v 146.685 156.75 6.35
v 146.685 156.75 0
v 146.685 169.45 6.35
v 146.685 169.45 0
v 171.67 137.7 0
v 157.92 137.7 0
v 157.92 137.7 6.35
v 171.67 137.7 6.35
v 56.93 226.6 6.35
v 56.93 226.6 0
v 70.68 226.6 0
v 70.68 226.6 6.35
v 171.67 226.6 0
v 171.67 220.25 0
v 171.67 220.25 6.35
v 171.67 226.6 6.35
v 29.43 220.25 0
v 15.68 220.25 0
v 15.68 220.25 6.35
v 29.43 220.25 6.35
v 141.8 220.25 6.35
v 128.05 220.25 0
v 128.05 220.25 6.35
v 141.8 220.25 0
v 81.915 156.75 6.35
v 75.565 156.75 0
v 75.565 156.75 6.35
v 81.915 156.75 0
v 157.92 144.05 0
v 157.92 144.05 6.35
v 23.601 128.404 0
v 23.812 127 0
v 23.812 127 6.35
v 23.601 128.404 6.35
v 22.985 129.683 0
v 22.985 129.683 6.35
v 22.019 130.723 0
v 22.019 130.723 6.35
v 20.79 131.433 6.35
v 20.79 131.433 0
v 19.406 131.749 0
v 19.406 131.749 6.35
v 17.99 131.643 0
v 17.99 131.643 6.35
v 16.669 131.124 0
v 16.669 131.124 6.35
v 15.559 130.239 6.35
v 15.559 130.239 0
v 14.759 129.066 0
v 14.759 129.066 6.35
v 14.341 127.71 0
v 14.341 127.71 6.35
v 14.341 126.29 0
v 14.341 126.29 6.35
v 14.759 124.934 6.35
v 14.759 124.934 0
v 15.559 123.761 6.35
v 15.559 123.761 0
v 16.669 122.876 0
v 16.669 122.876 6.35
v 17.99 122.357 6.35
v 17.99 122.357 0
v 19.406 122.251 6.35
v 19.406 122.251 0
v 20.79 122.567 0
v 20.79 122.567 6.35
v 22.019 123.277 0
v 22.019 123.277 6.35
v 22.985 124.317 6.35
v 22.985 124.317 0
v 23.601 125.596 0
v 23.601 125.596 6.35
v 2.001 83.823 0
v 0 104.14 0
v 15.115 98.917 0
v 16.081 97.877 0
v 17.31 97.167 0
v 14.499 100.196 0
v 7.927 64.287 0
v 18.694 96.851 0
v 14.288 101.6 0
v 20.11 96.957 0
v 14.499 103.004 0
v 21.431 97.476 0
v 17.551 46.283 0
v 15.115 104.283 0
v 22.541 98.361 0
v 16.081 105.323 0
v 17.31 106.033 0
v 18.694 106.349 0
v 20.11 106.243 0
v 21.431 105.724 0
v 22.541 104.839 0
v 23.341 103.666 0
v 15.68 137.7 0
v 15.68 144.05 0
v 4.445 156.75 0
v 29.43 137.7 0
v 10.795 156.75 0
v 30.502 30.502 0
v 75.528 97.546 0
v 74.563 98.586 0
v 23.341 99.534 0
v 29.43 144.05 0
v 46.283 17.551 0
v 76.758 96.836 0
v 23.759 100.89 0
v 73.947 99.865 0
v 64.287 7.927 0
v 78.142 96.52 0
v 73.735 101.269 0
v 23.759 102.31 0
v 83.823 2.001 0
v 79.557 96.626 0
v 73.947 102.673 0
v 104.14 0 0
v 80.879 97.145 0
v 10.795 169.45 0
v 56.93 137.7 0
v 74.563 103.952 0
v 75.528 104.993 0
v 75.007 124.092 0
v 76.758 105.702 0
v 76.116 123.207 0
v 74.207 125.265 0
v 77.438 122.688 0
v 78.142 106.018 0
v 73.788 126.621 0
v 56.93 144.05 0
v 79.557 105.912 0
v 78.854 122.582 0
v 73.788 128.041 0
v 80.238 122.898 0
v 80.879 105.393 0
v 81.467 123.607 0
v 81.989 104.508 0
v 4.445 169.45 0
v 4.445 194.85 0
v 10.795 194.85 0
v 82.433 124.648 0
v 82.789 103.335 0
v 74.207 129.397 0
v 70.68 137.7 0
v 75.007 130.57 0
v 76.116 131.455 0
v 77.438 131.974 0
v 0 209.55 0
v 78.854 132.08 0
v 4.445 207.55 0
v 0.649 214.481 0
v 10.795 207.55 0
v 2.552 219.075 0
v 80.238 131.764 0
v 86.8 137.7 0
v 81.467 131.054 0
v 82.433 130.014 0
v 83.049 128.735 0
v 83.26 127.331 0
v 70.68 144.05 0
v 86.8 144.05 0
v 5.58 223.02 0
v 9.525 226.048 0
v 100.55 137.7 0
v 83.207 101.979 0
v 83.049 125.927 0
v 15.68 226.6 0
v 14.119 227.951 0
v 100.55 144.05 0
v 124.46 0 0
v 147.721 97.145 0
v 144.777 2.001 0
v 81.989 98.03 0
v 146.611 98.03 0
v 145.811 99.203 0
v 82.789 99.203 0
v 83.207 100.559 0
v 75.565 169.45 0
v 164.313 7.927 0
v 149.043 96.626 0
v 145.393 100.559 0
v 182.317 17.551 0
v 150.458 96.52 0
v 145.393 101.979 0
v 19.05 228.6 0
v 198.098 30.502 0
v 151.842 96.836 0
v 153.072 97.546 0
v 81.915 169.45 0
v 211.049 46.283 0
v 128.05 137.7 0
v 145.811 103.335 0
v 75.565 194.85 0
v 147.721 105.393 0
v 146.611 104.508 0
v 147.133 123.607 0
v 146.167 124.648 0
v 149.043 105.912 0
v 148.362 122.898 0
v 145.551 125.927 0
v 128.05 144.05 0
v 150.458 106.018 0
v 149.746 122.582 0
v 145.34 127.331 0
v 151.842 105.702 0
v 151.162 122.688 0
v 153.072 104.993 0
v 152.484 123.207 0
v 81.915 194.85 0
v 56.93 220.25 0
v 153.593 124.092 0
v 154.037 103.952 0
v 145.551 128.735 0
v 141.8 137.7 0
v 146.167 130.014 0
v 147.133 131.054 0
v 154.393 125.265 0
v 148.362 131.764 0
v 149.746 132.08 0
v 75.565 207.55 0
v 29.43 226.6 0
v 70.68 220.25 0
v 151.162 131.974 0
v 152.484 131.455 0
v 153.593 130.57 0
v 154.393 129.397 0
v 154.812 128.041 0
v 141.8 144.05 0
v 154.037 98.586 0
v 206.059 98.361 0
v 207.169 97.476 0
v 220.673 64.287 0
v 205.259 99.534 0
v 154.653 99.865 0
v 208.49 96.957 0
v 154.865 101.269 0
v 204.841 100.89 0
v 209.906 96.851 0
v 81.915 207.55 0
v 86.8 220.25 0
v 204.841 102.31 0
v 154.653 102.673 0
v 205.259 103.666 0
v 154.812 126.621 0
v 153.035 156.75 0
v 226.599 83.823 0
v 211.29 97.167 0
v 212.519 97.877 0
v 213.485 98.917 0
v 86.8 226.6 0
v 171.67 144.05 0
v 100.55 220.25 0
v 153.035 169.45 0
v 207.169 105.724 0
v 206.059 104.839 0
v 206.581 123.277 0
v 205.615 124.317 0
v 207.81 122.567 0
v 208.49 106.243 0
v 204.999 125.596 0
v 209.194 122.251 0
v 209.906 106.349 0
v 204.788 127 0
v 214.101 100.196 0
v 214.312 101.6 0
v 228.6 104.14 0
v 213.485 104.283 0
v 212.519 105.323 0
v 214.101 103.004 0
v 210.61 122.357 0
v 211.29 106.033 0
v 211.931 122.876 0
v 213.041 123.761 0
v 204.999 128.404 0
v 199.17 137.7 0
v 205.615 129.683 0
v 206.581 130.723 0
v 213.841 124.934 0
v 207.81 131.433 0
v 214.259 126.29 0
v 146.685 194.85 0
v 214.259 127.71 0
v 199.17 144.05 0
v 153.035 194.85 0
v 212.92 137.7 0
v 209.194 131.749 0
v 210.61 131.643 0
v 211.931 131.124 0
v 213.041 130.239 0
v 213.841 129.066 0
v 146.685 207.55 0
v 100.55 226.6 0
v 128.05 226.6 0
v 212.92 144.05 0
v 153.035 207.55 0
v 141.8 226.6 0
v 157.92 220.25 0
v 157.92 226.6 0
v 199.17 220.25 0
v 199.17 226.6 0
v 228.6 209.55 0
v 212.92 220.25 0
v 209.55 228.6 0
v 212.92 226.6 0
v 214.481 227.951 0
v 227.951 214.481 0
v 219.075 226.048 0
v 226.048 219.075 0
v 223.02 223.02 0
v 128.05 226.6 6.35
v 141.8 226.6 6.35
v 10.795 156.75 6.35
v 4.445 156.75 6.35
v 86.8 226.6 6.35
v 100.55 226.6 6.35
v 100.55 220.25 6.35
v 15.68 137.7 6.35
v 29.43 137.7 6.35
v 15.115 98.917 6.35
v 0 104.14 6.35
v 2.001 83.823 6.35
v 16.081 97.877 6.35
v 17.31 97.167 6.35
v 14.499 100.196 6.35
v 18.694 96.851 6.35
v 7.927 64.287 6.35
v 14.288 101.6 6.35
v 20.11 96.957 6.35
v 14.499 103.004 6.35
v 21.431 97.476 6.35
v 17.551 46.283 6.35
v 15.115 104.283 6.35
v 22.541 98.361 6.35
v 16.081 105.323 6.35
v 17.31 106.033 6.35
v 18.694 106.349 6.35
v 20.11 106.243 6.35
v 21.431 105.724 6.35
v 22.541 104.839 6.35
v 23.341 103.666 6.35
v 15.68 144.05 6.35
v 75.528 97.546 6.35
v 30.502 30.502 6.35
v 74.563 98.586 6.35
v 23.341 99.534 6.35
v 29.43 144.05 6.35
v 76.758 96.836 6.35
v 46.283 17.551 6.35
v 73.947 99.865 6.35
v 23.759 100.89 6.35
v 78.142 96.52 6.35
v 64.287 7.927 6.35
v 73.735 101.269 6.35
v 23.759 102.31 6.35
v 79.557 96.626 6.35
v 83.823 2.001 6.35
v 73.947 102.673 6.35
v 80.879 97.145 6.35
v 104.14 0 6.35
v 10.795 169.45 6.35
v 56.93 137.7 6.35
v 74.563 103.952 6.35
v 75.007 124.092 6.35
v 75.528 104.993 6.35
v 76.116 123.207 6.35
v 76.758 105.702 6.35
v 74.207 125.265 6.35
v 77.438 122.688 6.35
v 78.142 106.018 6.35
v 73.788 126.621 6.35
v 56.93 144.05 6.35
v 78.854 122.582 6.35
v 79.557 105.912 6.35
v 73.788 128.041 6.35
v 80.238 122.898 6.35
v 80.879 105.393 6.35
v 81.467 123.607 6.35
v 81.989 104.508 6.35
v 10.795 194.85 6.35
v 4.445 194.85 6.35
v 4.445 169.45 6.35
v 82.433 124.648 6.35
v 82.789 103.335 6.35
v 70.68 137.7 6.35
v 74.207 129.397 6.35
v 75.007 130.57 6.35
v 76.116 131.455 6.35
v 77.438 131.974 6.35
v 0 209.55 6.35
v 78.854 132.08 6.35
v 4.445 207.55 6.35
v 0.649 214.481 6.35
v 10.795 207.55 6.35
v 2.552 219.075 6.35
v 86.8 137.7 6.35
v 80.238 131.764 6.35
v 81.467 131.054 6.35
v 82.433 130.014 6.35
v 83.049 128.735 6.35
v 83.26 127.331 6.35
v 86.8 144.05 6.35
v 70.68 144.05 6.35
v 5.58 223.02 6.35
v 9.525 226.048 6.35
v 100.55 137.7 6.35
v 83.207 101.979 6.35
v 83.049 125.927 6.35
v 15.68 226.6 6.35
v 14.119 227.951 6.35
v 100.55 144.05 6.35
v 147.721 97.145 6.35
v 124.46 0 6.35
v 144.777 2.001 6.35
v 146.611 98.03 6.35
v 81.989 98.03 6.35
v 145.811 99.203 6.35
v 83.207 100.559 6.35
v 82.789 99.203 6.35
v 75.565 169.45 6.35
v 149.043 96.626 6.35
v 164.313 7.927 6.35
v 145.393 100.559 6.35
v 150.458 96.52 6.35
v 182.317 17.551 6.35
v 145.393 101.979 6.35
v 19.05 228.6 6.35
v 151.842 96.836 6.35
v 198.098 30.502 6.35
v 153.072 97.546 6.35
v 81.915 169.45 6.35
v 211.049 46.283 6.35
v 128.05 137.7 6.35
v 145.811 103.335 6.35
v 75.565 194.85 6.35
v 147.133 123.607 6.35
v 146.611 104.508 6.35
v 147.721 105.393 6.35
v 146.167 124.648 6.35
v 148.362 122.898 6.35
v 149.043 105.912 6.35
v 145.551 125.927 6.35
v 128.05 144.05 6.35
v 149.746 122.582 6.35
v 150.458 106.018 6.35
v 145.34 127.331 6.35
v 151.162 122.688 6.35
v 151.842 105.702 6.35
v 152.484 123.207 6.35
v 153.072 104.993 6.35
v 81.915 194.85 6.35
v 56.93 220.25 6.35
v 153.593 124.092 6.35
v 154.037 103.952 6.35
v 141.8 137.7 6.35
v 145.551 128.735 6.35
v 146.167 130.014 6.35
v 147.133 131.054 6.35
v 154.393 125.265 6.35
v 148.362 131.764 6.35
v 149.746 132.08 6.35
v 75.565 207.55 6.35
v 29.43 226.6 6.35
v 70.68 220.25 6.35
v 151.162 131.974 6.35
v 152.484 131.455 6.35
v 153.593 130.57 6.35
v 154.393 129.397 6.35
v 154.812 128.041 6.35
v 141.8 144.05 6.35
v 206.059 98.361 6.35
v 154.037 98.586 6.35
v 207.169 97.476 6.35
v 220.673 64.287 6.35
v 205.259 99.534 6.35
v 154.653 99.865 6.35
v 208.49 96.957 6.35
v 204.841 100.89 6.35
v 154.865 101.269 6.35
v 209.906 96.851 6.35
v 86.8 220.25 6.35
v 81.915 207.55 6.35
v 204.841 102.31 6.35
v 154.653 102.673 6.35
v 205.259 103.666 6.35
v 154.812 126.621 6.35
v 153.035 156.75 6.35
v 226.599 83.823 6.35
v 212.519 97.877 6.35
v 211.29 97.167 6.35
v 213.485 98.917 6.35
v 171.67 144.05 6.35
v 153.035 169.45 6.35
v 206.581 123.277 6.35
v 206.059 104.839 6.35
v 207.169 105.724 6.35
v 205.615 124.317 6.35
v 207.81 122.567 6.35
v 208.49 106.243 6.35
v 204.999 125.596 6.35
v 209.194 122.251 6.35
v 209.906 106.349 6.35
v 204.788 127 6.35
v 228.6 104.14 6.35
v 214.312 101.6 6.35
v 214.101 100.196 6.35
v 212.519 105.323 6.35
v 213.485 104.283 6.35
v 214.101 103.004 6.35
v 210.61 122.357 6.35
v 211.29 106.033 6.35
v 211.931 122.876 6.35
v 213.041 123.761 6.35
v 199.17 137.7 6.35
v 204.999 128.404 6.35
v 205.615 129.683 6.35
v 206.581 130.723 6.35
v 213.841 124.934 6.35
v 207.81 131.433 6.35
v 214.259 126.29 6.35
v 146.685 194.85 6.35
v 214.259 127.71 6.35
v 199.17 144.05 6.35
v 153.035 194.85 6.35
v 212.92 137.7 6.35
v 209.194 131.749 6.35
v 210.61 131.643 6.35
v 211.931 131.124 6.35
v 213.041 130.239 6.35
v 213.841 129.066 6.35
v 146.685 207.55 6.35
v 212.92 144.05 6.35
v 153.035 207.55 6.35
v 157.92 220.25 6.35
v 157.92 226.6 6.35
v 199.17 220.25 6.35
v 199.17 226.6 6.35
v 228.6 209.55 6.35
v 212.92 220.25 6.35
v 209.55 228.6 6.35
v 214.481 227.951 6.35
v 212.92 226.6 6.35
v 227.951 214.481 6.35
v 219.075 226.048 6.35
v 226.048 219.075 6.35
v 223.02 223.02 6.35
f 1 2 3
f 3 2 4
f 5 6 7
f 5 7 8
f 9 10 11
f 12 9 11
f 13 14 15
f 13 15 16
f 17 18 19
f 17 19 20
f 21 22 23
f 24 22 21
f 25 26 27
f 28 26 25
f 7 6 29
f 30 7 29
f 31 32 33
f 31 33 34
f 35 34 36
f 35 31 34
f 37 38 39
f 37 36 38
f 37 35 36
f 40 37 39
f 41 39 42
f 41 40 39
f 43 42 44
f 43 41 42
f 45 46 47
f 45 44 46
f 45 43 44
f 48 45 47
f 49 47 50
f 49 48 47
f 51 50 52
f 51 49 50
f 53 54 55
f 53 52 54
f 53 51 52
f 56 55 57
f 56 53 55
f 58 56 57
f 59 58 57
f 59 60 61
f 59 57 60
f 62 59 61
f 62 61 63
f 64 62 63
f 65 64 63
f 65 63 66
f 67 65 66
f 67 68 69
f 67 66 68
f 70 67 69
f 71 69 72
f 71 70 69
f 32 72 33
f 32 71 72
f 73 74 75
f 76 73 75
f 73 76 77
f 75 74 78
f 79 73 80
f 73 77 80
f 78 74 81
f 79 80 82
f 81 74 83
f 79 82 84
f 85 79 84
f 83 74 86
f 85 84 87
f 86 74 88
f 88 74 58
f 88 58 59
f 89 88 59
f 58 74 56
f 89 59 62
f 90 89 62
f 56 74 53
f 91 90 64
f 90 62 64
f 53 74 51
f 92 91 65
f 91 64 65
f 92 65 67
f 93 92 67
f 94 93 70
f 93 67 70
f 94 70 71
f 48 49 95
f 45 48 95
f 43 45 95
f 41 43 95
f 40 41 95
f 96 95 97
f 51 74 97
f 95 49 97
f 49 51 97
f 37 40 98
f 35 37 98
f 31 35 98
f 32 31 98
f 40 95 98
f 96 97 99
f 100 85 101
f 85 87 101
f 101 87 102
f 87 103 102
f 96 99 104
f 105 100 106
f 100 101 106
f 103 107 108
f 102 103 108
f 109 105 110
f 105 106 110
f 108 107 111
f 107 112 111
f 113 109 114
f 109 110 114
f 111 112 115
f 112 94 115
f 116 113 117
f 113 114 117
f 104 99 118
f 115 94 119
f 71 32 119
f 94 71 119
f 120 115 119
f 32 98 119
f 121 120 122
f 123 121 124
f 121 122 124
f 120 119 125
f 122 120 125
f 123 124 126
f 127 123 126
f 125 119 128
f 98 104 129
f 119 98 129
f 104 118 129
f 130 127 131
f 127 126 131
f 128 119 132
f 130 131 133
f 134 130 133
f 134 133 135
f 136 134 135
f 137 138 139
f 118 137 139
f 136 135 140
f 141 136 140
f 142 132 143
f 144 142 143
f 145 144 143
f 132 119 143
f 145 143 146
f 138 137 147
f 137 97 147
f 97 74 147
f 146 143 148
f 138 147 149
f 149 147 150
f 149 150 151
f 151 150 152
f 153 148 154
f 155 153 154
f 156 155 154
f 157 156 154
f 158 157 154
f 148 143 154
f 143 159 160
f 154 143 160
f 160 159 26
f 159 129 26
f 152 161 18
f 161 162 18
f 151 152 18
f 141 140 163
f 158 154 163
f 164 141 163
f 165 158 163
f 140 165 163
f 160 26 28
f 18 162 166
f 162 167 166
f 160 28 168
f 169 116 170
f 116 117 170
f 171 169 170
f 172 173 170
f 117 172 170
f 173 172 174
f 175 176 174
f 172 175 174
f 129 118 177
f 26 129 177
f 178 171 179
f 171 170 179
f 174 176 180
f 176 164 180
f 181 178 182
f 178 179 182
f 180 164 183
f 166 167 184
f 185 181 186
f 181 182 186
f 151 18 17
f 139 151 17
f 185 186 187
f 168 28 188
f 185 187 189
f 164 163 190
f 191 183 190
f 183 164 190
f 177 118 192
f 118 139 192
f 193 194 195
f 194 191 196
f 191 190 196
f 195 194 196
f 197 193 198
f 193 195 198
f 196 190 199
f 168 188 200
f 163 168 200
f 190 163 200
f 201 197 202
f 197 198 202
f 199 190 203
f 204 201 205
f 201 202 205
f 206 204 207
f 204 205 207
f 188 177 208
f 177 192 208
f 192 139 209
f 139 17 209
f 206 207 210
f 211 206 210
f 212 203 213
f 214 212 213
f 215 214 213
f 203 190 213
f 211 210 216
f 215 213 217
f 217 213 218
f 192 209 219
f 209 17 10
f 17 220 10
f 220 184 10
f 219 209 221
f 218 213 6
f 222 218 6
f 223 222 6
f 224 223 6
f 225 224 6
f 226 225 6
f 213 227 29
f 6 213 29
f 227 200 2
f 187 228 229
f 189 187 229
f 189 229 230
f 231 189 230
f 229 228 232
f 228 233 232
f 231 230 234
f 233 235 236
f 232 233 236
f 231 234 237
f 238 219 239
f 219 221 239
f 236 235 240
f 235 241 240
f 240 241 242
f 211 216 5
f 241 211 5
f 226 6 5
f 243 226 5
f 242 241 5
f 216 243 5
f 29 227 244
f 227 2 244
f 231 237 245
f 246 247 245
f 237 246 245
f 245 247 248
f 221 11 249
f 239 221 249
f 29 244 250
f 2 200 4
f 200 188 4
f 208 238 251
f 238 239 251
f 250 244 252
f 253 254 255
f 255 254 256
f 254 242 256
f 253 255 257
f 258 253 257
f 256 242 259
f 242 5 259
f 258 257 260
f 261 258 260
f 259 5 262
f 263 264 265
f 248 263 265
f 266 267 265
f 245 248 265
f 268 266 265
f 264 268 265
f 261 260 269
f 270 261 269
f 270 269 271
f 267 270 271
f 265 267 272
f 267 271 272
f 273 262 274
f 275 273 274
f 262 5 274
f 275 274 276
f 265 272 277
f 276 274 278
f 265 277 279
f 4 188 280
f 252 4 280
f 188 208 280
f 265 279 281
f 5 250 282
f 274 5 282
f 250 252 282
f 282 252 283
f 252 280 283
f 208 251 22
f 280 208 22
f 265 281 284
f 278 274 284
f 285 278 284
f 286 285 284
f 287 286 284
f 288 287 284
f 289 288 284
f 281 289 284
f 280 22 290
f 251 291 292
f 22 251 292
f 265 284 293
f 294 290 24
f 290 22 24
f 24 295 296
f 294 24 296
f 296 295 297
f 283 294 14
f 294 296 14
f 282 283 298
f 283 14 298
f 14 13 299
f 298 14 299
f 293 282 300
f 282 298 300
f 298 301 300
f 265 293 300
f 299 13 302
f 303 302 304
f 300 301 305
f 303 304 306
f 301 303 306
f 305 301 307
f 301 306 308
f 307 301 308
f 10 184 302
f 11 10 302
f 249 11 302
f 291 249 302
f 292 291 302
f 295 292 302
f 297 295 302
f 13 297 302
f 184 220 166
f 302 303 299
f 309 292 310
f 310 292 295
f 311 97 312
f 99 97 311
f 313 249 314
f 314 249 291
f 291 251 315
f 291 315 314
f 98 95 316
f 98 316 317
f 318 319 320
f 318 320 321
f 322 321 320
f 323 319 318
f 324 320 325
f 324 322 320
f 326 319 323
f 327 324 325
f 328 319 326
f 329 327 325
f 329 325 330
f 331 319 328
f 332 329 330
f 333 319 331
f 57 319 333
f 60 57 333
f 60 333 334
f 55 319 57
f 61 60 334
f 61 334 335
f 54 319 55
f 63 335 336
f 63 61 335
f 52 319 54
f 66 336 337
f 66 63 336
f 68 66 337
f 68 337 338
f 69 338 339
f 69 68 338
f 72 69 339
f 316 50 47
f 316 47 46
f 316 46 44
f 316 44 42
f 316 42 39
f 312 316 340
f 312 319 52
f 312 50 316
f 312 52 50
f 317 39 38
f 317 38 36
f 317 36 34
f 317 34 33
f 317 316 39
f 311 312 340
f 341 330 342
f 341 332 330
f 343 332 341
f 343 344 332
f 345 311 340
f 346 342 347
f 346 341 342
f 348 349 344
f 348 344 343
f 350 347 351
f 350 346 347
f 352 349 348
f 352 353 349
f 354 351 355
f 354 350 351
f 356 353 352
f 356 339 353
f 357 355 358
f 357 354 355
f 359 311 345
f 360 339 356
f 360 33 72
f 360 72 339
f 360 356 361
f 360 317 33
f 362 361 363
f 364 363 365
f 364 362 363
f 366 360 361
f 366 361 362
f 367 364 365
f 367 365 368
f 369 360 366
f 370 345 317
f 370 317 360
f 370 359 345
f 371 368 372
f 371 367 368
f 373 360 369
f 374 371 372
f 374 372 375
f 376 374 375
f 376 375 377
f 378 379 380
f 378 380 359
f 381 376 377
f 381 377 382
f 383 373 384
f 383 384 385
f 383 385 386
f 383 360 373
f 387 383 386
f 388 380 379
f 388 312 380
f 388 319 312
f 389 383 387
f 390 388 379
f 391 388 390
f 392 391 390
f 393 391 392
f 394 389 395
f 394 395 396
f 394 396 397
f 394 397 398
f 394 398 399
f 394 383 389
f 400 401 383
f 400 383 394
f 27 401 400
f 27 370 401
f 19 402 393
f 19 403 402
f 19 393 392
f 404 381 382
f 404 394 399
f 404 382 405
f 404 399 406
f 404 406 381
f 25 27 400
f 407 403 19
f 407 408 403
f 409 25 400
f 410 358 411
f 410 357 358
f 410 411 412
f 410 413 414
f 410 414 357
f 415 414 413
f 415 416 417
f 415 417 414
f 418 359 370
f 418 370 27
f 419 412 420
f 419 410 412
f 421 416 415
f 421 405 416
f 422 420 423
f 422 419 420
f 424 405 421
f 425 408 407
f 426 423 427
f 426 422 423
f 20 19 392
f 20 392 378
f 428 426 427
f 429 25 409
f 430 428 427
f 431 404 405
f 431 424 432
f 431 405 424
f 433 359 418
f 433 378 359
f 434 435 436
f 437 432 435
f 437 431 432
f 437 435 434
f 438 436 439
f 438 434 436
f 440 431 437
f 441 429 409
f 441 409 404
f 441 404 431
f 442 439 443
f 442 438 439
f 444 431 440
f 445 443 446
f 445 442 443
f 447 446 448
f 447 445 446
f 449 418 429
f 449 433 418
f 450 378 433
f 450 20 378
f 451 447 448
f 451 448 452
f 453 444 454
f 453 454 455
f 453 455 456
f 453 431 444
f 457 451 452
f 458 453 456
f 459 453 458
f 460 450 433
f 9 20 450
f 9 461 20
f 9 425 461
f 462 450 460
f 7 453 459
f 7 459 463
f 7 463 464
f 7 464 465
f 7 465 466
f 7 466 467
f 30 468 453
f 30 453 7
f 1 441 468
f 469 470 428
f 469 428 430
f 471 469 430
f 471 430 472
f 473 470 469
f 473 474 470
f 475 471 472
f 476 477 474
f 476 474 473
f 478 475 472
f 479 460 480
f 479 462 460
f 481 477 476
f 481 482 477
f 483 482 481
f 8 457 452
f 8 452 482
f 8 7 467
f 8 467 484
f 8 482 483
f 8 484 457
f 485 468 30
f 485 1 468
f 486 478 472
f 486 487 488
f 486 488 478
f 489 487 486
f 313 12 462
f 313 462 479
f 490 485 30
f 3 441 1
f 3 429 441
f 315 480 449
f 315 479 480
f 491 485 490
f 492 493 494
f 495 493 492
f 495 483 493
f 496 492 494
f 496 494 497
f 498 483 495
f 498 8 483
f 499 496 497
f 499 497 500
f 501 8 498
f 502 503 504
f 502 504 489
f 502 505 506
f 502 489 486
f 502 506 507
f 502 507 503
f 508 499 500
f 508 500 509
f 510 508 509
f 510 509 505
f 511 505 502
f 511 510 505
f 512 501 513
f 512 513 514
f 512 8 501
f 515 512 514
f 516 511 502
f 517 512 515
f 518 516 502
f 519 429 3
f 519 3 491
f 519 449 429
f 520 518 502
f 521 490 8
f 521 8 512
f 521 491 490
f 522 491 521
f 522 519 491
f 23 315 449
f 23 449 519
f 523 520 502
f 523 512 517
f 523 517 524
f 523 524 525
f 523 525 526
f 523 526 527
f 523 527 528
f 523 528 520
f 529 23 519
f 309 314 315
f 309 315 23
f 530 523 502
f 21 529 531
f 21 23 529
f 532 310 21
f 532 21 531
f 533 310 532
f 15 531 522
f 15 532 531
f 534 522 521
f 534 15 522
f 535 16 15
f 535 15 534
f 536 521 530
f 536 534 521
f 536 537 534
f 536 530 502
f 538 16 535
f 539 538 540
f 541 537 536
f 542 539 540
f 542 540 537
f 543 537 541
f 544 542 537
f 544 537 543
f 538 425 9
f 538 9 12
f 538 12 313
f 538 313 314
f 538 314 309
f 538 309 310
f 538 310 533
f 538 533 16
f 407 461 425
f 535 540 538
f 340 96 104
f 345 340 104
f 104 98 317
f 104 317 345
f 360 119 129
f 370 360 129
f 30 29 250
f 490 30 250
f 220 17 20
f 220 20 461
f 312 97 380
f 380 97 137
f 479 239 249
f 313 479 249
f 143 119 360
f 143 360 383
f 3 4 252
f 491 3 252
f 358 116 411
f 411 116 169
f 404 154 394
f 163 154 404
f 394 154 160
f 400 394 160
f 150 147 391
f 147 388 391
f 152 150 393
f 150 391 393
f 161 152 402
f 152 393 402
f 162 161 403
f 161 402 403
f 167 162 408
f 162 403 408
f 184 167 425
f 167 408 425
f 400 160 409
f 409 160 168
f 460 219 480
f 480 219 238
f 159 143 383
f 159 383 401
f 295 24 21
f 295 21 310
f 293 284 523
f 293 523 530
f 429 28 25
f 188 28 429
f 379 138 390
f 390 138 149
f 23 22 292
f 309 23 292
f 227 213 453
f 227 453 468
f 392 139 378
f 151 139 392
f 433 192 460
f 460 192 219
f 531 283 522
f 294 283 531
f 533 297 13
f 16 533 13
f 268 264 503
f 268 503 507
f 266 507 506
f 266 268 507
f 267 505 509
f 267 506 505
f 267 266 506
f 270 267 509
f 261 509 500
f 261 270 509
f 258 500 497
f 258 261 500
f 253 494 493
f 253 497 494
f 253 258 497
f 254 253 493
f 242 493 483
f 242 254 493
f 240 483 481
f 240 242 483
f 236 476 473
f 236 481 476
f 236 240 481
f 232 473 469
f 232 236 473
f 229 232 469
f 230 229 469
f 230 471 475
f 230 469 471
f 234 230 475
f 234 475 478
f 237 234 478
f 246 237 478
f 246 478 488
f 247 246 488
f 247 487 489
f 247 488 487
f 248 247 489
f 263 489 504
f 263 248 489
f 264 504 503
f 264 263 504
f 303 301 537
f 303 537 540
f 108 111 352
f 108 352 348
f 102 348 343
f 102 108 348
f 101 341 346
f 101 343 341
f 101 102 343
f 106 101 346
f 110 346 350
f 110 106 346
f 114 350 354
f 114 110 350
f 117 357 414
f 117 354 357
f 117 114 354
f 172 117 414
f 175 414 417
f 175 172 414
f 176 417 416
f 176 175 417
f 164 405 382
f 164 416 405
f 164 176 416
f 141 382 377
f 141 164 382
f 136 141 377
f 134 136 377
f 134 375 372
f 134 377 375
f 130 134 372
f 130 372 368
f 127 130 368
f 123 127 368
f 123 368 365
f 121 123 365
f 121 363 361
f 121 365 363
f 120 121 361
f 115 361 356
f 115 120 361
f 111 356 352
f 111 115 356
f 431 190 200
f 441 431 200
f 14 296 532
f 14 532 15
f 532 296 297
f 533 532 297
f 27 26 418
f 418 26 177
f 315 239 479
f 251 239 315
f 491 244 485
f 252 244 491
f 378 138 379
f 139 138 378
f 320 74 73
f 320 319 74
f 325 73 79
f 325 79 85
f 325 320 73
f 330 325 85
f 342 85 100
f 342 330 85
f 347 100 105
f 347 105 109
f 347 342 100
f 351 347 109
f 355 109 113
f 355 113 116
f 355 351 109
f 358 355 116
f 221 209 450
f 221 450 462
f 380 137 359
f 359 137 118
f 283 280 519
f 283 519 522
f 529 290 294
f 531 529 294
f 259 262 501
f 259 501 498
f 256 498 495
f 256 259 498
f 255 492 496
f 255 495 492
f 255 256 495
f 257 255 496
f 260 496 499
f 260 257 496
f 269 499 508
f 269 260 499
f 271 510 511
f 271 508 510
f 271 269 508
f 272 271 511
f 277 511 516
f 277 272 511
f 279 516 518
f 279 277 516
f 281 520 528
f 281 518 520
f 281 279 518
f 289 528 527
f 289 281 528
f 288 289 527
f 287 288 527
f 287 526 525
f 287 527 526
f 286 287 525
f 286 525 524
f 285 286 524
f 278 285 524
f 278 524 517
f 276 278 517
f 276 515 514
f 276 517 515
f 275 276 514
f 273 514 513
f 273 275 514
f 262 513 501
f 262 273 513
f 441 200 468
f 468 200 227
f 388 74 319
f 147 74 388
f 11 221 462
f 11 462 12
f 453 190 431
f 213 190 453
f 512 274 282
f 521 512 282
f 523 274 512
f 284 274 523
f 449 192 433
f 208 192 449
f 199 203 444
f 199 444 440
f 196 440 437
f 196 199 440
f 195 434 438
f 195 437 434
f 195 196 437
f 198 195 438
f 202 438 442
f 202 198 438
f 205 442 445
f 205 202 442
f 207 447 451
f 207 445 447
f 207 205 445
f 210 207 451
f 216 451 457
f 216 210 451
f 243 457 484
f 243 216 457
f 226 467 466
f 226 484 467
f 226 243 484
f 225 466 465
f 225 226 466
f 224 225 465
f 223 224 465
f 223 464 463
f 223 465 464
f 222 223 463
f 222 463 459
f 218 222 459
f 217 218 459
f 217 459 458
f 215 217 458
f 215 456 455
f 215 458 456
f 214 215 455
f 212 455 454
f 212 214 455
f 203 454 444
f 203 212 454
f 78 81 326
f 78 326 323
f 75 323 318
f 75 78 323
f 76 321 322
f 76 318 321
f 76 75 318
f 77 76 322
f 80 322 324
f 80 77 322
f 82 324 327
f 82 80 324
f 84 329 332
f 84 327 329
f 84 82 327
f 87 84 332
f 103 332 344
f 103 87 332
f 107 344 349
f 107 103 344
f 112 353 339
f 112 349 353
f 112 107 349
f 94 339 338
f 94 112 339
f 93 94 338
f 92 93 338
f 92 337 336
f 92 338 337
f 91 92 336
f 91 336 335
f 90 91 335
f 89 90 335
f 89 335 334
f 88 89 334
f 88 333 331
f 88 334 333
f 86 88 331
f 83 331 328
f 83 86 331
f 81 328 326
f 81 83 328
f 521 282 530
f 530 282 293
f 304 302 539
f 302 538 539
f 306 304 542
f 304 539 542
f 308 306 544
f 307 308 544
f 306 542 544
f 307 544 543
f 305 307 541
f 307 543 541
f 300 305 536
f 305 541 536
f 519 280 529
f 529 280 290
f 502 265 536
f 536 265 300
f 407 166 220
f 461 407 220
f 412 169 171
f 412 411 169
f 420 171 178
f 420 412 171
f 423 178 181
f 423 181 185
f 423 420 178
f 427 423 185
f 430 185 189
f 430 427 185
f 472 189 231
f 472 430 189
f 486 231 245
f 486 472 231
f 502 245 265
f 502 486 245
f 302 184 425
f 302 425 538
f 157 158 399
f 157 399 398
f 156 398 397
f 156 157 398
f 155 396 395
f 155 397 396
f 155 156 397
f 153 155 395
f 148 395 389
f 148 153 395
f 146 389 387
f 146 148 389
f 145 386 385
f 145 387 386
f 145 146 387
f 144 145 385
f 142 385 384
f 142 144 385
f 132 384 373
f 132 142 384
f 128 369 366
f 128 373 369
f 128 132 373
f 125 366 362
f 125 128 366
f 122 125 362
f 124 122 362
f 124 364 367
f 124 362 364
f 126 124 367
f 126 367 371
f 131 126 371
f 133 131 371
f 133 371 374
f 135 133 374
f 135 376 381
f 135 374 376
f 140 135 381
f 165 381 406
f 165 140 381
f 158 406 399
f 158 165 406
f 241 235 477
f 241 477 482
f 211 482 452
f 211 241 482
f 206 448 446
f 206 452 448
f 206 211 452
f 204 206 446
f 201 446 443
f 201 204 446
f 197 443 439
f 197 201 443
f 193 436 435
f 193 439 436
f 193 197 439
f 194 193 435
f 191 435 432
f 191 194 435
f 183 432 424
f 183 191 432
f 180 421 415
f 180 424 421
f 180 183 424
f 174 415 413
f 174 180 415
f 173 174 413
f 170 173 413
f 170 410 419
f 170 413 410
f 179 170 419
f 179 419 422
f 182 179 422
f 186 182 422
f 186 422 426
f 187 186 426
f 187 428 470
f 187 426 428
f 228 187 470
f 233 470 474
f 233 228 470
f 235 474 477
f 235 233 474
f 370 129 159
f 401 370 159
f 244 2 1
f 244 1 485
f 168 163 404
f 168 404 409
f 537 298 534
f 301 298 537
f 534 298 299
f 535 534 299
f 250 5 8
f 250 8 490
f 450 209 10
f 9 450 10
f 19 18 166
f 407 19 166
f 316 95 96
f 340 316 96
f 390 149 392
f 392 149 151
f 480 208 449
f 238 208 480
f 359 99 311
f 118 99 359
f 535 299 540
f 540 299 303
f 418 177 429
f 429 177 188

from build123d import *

# Parameters (mm, degrees)
SKETCH1_W               = 228.6
SKETCH1_H               = 228.6
BOSS_EXTRUDE1_DEPTH     = 6.35
CUT_EXTRUDE1_DEPTH      = 324.351577234
CUT_EXTRUDE1_DEPTH_BACK = 324.351577234
SKETCH2_W               = 13.749999996
SKETCH2_H               = 6.35
SKETCH2_W_2             = 13.749999995
CUT_EXTRUDE2_DEPTH      = 324.351577234
CUT_EXTRUDE2_DEPTH_BACK = 324.351577234
SKETCH3_R               = 4.7625
FILLET1_R               = 19.05
FILLET2_R               = 104.14
CUT_EXTRUDE3_DEPTH      = 324.351577234
CUT_EXTRUDE3_DEPTH_BACK = 324.351577234
SKETCH4_W               = 6.35
SKETCH4_H               = 12.7
CUT_EXTRUDE4_DEPTH      = 324.351577234
CUT_EXTRUDE4_DEPTH_BACK = 324.351577234
SKETCH5_R               = 4.7625


with BuildPart() as part:
    # Sketch1 → Boss-Extrude1 (new body)
    with BuildSketch(Plane.XY):
        with Locations((114.3, 114.3)):
            Rectangle(SKETCH1_W, SKETCH1_H)
    extrude(amount=BOSS_EXTRUDE1_DEPTH)

    # Sketch2 → Cut-Extrude1 (cut, two sides: drawn at the far end of the back side and taken through both)
    with BuildSketch(Plane.XY.offset(6.35).offset(-CUT_EXTRUDE1_DEPTH_BACK)):
        with Locations((134.924999993, 223.424999936)):
            Rectangle(SKETCH2_W, SKETCH2_H)
        with Locations((93.675000006, 223.424999936)):
            Rectangle(SKETCH2_W_2, SKETCH2_H)
        with Locations((206.044999993, 223.424999936)):
            Rectangle(SKETCH2_W, SKETCH2_H)
        with Locations((164.795000007, 223.424999936)):
            Rectangle(SKETCH2_W_2, SKETCH2_H)
        with Locations((22.555000007, 223.424999936)):
            Rectangle(SKETCH2_W_2, SKETCH2_H)
        with Locations((63.804999993, 223.424999936)):
            Rectangle(SKETCH2_W, SKETCH2_H)
        with Locations((206.044999993, 140.874999936)):
            Rectangle(SKETCH2_W, SKETCH2_H)
        with Locations((164.795000007, 140.874999936)):
            Rectangle(SKETCH2_W_2, SKETCH2_H)
        with Locations((134.924999993, 140.874999936)):
            Rectangle(SKETCH2_W, SKETCH2_H)
        with Locations((93.675000006, 140.874999936)):
            Rectangle(SKETCH2_W_2, SKETCH2_H)
        with Locations((63.804999993, 140.874999936)):
            Rectangle(SKETCH2_W, SKETCH2_H)
        with Locations((22.555000007, 140.874999936)):
            Rectangle(SKETCH2_W, SKETCH2_H)
    extrude(amount=CUT_EXTRUDE1_DEPTH + CUT_EXTRUDE1_DEPTH_BACK, mode=Mode.SUBTRACT)

    # Sketch3 → Cut-Extrude2 (cut, two sides: drawn at the far end of the back side and taken through both)
    with BuildSketch(Plane.XY.offset(6.35).offset(-CUT_EXTRUDE2_DEPTH_BACK)):
        with Locations((19.05, 127)):
            Circle(SKETCH3_R)
        with Locations(Location((19.05, 101.6, 0), (0, 0, 180))):
            Circle(SKETCH3_R)
        with Locations((209.55, 101.6)):
            Circle(SKETCH3_R)
        with Locations(Location((209.55, 127, 0), (0, 0, 180))):
            Circle(SKETCH3_R)
    extrude(amount=CUT_EXTRUDE2_DEPTH + CUT_EXTRUDE2_DEPTH_BACK, mode=Mode.SUBTRACT)

    # Fillet1
    fillet1_edges = [part.edges().sort_by_distance(p)[0] for p in [
        (0, 228.6, 3.175),
        (228.6, 228.6, 3.175),
    ]]
    fillet(fillet1_edges, radius=FILLET1_R)

    # Fillet2
    fillet2_edges = [part.edges().sort_by_distance(p)[0] for p in [
        (228.6, 0, 3.175),
        (0, 0, 3.175),
    ]]
    fillet(fillet2_edges, radius=FILLET2_R)

    # Sketch4 → Cut-Extrude3 (cut, two sides: drawn at the far end of the back side and taken through both)
    with BuildSketch(Plane.XY.offset(6.35).offset(-CUT_EXTRUDE3_DEPTH_BACK)):
        with Locations((78.74, 201.199999936)):
            Rectangle(SKETCH4_W, SKETCH4_H)
        with Locations((78.74, 163.099999936)):
            Rectangle(SKETCH4_W, SKETCH4_H)
        with Locations((149.86, 163.099999936)):
            Rectangle(SKETCH4_W, SKETCH4_H)
        with Locations((149.86, 201.199999936)):
            Rectangle(SKETCH4_W, SKETCH4_H)
        with Locations((7.62, 163.099999936)):
            Rectangle(SKETCH4_W, SKETCH4_H)
        with Locations((7.62, 201.199999936)):
            Rectangle(SKETCH4_W, SKETCH4_H)
    extrude(amount=CUT_EXTRUDE3_DEPTH + CUT_EXTRUDE3_DEPTH_BACK, mode=Mode.SUBTRACT)

    # Sketch5 → Cut-Extrude4 (cut, two sides: drawn at the far end of the back side and taken through both)
    with BuildSketch(Plane.XY.offset(6.35).offset(-CUT_EXTRUDE4_DEPTH_BACK)):
        with Locations((78.497711148, 127.330967461)):
            Circle(SKETCH5_R)
        with Locations(Location((150.102288852, 127.330967461, 0), (0, 0, 180))):
            Circle(SKETCH5_R)
        with Locations((150.102288852, 101.269032539)):
            Circle(SKETCH5_R)
        with Locations(Location((78.497711148, 101.269032539, 0), (0, 0, 180))):
            Circle(SKETCH5_R)
    extrude(amount=CUT_EXTRUDE4_DEPTH + CUT_EXTRUDE4_DEPTH_BACK, mode=Mode.SUBTRACT)


solid = part.part
